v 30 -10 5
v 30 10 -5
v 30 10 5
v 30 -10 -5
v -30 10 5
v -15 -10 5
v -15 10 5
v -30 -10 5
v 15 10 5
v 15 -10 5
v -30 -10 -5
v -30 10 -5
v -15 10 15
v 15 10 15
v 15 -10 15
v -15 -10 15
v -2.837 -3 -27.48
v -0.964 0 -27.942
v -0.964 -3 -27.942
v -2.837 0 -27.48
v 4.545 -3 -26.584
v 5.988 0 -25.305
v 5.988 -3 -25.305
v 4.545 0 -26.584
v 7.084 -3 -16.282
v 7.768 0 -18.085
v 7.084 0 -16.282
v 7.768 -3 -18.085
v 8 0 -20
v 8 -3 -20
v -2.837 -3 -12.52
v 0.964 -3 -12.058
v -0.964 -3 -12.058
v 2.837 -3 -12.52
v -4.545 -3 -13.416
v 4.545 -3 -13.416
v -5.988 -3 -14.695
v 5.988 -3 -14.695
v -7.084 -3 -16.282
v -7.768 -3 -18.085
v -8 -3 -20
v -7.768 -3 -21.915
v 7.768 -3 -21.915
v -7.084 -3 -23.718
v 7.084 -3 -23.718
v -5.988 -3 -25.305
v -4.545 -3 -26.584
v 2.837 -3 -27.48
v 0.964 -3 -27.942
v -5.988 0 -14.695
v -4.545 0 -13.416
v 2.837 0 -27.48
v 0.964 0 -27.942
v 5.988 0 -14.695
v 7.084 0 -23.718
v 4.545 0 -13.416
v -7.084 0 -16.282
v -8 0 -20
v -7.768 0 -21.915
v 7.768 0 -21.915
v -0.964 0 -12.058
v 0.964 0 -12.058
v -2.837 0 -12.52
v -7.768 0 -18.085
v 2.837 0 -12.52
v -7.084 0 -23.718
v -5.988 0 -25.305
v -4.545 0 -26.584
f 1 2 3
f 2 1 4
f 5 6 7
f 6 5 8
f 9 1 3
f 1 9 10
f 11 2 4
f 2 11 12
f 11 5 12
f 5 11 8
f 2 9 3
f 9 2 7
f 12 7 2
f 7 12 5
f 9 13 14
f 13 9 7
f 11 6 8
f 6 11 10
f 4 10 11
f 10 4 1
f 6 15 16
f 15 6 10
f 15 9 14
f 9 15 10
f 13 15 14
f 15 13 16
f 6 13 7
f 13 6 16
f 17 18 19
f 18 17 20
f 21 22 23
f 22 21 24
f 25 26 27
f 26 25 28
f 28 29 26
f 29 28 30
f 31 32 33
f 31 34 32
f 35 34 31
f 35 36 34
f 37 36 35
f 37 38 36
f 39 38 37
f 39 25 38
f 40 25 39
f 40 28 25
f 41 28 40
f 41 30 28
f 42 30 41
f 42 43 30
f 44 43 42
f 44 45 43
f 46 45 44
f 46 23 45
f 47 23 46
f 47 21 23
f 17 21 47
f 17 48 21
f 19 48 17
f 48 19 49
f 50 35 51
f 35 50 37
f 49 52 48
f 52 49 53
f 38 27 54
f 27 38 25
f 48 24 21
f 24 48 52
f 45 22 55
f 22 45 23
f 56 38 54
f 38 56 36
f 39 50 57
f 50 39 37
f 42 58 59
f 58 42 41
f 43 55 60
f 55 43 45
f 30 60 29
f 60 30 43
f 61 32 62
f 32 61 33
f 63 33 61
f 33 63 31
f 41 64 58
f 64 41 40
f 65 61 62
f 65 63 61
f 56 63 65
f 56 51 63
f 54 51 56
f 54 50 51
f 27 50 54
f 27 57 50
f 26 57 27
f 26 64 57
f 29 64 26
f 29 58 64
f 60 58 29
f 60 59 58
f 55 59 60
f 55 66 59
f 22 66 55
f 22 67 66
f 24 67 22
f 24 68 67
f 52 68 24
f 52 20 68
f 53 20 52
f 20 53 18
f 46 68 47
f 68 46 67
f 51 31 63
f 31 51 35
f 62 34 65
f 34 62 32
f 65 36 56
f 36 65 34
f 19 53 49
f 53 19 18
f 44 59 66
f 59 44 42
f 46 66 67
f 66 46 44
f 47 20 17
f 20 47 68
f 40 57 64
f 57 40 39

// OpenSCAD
// Primer ejemplo de OPENSCAD
cube([60,20,10],center=true);
translate([0,0,10])
    cube([30,20,10],center=true);
rotate([90,0,0])
    translate([0,-20,0])
        cylinder(h=3,r=8);
